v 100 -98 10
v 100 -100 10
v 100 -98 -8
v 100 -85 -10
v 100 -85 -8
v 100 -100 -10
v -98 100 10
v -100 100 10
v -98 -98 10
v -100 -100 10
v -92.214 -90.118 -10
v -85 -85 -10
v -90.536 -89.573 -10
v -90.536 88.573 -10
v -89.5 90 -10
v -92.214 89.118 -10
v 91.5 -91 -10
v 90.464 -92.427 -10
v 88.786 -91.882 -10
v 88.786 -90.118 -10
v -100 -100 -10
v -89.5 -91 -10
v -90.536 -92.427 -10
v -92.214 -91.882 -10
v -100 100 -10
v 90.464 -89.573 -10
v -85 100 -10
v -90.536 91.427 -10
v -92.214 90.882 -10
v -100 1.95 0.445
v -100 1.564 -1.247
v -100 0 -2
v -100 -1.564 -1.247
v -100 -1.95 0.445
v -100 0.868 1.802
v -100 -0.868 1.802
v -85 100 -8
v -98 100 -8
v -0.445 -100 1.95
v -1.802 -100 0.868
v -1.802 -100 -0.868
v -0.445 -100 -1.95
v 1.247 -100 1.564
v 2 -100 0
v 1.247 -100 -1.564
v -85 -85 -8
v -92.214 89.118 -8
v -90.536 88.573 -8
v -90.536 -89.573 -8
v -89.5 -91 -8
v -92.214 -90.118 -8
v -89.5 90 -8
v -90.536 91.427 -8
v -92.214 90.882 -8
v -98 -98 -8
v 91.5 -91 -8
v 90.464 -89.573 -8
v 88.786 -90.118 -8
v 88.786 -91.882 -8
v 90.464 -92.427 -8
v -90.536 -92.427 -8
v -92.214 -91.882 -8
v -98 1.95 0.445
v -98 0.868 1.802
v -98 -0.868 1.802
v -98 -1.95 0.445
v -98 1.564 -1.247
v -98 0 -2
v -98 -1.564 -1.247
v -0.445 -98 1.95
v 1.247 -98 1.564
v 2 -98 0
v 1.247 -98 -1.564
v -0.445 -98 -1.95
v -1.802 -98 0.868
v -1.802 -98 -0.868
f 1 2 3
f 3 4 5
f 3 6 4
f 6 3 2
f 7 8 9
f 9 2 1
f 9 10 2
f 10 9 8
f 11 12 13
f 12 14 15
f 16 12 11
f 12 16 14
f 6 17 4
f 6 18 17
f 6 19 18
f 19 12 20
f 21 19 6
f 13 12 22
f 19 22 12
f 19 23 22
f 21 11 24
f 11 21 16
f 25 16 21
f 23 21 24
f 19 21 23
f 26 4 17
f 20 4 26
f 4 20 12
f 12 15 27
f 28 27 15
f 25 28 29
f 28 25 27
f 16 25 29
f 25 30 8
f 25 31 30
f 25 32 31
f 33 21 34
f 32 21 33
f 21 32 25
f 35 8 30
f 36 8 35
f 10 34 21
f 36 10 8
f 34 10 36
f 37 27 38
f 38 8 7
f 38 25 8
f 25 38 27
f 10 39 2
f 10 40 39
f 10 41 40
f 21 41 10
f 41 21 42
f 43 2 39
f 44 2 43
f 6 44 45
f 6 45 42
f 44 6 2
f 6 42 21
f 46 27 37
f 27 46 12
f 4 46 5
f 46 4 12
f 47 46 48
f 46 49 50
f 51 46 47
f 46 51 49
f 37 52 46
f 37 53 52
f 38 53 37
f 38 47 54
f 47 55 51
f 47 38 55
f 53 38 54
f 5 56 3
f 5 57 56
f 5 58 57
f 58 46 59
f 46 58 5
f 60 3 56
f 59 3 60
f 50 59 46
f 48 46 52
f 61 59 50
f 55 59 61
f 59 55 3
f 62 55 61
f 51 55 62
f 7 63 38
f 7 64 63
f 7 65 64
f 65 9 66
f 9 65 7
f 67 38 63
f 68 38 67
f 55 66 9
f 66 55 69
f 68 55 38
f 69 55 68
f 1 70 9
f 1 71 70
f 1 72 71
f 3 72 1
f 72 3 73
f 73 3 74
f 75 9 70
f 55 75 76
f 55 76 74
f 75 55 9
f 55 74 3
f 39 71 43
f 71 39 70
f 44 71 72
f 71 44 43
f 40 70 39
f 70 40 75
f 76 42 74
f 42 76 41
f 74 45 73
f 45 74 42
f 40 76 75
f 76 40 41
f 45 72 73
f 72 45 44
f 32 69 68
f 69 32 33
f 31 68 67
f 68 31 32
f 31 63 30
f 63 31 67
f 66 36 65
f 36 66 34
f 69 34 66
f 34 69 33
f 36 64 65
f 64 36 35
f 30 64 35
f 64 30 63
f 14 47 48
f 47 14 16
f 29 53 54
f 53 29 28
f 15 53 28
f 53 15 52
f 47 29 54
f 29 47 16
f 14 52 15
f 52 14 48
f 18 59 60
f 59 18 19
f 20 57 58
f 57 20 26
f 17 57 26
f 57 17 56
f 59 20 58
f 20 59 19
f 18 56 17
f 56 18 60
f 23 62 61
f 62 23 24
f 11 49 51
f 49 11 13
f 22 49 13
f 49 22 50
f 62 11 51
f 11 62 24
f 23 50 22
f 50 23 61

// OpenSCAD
D = 2;

difference() {
  cube([200, 200, 20], center = true);
  translate([15, 15, 0])
    cube([200, 200, 40], center = true);
 translate([D, D, D])
  cube([200, 200, 20], center = true);
rotate([90, 0, 0])
  cylinder(r = 2, h = 300, center = true);
rotate([0, 90, 0])
  cylinder(r = 2, h = 300, center = true);

translate([-(100-20/2)-D/2, 100-10, 0])
cylinder(r = 1.5, h = 300, center = true);

translate([100-10, -(100-20/2)-D/2, 0])
cylinder(r = 1.5, h = 300, center = true);

translate([-(100-20/2)-D/2, -(100-20/2)-D/2, 0])
cylinder(r = 1.5, h = 300, center = true);

}
